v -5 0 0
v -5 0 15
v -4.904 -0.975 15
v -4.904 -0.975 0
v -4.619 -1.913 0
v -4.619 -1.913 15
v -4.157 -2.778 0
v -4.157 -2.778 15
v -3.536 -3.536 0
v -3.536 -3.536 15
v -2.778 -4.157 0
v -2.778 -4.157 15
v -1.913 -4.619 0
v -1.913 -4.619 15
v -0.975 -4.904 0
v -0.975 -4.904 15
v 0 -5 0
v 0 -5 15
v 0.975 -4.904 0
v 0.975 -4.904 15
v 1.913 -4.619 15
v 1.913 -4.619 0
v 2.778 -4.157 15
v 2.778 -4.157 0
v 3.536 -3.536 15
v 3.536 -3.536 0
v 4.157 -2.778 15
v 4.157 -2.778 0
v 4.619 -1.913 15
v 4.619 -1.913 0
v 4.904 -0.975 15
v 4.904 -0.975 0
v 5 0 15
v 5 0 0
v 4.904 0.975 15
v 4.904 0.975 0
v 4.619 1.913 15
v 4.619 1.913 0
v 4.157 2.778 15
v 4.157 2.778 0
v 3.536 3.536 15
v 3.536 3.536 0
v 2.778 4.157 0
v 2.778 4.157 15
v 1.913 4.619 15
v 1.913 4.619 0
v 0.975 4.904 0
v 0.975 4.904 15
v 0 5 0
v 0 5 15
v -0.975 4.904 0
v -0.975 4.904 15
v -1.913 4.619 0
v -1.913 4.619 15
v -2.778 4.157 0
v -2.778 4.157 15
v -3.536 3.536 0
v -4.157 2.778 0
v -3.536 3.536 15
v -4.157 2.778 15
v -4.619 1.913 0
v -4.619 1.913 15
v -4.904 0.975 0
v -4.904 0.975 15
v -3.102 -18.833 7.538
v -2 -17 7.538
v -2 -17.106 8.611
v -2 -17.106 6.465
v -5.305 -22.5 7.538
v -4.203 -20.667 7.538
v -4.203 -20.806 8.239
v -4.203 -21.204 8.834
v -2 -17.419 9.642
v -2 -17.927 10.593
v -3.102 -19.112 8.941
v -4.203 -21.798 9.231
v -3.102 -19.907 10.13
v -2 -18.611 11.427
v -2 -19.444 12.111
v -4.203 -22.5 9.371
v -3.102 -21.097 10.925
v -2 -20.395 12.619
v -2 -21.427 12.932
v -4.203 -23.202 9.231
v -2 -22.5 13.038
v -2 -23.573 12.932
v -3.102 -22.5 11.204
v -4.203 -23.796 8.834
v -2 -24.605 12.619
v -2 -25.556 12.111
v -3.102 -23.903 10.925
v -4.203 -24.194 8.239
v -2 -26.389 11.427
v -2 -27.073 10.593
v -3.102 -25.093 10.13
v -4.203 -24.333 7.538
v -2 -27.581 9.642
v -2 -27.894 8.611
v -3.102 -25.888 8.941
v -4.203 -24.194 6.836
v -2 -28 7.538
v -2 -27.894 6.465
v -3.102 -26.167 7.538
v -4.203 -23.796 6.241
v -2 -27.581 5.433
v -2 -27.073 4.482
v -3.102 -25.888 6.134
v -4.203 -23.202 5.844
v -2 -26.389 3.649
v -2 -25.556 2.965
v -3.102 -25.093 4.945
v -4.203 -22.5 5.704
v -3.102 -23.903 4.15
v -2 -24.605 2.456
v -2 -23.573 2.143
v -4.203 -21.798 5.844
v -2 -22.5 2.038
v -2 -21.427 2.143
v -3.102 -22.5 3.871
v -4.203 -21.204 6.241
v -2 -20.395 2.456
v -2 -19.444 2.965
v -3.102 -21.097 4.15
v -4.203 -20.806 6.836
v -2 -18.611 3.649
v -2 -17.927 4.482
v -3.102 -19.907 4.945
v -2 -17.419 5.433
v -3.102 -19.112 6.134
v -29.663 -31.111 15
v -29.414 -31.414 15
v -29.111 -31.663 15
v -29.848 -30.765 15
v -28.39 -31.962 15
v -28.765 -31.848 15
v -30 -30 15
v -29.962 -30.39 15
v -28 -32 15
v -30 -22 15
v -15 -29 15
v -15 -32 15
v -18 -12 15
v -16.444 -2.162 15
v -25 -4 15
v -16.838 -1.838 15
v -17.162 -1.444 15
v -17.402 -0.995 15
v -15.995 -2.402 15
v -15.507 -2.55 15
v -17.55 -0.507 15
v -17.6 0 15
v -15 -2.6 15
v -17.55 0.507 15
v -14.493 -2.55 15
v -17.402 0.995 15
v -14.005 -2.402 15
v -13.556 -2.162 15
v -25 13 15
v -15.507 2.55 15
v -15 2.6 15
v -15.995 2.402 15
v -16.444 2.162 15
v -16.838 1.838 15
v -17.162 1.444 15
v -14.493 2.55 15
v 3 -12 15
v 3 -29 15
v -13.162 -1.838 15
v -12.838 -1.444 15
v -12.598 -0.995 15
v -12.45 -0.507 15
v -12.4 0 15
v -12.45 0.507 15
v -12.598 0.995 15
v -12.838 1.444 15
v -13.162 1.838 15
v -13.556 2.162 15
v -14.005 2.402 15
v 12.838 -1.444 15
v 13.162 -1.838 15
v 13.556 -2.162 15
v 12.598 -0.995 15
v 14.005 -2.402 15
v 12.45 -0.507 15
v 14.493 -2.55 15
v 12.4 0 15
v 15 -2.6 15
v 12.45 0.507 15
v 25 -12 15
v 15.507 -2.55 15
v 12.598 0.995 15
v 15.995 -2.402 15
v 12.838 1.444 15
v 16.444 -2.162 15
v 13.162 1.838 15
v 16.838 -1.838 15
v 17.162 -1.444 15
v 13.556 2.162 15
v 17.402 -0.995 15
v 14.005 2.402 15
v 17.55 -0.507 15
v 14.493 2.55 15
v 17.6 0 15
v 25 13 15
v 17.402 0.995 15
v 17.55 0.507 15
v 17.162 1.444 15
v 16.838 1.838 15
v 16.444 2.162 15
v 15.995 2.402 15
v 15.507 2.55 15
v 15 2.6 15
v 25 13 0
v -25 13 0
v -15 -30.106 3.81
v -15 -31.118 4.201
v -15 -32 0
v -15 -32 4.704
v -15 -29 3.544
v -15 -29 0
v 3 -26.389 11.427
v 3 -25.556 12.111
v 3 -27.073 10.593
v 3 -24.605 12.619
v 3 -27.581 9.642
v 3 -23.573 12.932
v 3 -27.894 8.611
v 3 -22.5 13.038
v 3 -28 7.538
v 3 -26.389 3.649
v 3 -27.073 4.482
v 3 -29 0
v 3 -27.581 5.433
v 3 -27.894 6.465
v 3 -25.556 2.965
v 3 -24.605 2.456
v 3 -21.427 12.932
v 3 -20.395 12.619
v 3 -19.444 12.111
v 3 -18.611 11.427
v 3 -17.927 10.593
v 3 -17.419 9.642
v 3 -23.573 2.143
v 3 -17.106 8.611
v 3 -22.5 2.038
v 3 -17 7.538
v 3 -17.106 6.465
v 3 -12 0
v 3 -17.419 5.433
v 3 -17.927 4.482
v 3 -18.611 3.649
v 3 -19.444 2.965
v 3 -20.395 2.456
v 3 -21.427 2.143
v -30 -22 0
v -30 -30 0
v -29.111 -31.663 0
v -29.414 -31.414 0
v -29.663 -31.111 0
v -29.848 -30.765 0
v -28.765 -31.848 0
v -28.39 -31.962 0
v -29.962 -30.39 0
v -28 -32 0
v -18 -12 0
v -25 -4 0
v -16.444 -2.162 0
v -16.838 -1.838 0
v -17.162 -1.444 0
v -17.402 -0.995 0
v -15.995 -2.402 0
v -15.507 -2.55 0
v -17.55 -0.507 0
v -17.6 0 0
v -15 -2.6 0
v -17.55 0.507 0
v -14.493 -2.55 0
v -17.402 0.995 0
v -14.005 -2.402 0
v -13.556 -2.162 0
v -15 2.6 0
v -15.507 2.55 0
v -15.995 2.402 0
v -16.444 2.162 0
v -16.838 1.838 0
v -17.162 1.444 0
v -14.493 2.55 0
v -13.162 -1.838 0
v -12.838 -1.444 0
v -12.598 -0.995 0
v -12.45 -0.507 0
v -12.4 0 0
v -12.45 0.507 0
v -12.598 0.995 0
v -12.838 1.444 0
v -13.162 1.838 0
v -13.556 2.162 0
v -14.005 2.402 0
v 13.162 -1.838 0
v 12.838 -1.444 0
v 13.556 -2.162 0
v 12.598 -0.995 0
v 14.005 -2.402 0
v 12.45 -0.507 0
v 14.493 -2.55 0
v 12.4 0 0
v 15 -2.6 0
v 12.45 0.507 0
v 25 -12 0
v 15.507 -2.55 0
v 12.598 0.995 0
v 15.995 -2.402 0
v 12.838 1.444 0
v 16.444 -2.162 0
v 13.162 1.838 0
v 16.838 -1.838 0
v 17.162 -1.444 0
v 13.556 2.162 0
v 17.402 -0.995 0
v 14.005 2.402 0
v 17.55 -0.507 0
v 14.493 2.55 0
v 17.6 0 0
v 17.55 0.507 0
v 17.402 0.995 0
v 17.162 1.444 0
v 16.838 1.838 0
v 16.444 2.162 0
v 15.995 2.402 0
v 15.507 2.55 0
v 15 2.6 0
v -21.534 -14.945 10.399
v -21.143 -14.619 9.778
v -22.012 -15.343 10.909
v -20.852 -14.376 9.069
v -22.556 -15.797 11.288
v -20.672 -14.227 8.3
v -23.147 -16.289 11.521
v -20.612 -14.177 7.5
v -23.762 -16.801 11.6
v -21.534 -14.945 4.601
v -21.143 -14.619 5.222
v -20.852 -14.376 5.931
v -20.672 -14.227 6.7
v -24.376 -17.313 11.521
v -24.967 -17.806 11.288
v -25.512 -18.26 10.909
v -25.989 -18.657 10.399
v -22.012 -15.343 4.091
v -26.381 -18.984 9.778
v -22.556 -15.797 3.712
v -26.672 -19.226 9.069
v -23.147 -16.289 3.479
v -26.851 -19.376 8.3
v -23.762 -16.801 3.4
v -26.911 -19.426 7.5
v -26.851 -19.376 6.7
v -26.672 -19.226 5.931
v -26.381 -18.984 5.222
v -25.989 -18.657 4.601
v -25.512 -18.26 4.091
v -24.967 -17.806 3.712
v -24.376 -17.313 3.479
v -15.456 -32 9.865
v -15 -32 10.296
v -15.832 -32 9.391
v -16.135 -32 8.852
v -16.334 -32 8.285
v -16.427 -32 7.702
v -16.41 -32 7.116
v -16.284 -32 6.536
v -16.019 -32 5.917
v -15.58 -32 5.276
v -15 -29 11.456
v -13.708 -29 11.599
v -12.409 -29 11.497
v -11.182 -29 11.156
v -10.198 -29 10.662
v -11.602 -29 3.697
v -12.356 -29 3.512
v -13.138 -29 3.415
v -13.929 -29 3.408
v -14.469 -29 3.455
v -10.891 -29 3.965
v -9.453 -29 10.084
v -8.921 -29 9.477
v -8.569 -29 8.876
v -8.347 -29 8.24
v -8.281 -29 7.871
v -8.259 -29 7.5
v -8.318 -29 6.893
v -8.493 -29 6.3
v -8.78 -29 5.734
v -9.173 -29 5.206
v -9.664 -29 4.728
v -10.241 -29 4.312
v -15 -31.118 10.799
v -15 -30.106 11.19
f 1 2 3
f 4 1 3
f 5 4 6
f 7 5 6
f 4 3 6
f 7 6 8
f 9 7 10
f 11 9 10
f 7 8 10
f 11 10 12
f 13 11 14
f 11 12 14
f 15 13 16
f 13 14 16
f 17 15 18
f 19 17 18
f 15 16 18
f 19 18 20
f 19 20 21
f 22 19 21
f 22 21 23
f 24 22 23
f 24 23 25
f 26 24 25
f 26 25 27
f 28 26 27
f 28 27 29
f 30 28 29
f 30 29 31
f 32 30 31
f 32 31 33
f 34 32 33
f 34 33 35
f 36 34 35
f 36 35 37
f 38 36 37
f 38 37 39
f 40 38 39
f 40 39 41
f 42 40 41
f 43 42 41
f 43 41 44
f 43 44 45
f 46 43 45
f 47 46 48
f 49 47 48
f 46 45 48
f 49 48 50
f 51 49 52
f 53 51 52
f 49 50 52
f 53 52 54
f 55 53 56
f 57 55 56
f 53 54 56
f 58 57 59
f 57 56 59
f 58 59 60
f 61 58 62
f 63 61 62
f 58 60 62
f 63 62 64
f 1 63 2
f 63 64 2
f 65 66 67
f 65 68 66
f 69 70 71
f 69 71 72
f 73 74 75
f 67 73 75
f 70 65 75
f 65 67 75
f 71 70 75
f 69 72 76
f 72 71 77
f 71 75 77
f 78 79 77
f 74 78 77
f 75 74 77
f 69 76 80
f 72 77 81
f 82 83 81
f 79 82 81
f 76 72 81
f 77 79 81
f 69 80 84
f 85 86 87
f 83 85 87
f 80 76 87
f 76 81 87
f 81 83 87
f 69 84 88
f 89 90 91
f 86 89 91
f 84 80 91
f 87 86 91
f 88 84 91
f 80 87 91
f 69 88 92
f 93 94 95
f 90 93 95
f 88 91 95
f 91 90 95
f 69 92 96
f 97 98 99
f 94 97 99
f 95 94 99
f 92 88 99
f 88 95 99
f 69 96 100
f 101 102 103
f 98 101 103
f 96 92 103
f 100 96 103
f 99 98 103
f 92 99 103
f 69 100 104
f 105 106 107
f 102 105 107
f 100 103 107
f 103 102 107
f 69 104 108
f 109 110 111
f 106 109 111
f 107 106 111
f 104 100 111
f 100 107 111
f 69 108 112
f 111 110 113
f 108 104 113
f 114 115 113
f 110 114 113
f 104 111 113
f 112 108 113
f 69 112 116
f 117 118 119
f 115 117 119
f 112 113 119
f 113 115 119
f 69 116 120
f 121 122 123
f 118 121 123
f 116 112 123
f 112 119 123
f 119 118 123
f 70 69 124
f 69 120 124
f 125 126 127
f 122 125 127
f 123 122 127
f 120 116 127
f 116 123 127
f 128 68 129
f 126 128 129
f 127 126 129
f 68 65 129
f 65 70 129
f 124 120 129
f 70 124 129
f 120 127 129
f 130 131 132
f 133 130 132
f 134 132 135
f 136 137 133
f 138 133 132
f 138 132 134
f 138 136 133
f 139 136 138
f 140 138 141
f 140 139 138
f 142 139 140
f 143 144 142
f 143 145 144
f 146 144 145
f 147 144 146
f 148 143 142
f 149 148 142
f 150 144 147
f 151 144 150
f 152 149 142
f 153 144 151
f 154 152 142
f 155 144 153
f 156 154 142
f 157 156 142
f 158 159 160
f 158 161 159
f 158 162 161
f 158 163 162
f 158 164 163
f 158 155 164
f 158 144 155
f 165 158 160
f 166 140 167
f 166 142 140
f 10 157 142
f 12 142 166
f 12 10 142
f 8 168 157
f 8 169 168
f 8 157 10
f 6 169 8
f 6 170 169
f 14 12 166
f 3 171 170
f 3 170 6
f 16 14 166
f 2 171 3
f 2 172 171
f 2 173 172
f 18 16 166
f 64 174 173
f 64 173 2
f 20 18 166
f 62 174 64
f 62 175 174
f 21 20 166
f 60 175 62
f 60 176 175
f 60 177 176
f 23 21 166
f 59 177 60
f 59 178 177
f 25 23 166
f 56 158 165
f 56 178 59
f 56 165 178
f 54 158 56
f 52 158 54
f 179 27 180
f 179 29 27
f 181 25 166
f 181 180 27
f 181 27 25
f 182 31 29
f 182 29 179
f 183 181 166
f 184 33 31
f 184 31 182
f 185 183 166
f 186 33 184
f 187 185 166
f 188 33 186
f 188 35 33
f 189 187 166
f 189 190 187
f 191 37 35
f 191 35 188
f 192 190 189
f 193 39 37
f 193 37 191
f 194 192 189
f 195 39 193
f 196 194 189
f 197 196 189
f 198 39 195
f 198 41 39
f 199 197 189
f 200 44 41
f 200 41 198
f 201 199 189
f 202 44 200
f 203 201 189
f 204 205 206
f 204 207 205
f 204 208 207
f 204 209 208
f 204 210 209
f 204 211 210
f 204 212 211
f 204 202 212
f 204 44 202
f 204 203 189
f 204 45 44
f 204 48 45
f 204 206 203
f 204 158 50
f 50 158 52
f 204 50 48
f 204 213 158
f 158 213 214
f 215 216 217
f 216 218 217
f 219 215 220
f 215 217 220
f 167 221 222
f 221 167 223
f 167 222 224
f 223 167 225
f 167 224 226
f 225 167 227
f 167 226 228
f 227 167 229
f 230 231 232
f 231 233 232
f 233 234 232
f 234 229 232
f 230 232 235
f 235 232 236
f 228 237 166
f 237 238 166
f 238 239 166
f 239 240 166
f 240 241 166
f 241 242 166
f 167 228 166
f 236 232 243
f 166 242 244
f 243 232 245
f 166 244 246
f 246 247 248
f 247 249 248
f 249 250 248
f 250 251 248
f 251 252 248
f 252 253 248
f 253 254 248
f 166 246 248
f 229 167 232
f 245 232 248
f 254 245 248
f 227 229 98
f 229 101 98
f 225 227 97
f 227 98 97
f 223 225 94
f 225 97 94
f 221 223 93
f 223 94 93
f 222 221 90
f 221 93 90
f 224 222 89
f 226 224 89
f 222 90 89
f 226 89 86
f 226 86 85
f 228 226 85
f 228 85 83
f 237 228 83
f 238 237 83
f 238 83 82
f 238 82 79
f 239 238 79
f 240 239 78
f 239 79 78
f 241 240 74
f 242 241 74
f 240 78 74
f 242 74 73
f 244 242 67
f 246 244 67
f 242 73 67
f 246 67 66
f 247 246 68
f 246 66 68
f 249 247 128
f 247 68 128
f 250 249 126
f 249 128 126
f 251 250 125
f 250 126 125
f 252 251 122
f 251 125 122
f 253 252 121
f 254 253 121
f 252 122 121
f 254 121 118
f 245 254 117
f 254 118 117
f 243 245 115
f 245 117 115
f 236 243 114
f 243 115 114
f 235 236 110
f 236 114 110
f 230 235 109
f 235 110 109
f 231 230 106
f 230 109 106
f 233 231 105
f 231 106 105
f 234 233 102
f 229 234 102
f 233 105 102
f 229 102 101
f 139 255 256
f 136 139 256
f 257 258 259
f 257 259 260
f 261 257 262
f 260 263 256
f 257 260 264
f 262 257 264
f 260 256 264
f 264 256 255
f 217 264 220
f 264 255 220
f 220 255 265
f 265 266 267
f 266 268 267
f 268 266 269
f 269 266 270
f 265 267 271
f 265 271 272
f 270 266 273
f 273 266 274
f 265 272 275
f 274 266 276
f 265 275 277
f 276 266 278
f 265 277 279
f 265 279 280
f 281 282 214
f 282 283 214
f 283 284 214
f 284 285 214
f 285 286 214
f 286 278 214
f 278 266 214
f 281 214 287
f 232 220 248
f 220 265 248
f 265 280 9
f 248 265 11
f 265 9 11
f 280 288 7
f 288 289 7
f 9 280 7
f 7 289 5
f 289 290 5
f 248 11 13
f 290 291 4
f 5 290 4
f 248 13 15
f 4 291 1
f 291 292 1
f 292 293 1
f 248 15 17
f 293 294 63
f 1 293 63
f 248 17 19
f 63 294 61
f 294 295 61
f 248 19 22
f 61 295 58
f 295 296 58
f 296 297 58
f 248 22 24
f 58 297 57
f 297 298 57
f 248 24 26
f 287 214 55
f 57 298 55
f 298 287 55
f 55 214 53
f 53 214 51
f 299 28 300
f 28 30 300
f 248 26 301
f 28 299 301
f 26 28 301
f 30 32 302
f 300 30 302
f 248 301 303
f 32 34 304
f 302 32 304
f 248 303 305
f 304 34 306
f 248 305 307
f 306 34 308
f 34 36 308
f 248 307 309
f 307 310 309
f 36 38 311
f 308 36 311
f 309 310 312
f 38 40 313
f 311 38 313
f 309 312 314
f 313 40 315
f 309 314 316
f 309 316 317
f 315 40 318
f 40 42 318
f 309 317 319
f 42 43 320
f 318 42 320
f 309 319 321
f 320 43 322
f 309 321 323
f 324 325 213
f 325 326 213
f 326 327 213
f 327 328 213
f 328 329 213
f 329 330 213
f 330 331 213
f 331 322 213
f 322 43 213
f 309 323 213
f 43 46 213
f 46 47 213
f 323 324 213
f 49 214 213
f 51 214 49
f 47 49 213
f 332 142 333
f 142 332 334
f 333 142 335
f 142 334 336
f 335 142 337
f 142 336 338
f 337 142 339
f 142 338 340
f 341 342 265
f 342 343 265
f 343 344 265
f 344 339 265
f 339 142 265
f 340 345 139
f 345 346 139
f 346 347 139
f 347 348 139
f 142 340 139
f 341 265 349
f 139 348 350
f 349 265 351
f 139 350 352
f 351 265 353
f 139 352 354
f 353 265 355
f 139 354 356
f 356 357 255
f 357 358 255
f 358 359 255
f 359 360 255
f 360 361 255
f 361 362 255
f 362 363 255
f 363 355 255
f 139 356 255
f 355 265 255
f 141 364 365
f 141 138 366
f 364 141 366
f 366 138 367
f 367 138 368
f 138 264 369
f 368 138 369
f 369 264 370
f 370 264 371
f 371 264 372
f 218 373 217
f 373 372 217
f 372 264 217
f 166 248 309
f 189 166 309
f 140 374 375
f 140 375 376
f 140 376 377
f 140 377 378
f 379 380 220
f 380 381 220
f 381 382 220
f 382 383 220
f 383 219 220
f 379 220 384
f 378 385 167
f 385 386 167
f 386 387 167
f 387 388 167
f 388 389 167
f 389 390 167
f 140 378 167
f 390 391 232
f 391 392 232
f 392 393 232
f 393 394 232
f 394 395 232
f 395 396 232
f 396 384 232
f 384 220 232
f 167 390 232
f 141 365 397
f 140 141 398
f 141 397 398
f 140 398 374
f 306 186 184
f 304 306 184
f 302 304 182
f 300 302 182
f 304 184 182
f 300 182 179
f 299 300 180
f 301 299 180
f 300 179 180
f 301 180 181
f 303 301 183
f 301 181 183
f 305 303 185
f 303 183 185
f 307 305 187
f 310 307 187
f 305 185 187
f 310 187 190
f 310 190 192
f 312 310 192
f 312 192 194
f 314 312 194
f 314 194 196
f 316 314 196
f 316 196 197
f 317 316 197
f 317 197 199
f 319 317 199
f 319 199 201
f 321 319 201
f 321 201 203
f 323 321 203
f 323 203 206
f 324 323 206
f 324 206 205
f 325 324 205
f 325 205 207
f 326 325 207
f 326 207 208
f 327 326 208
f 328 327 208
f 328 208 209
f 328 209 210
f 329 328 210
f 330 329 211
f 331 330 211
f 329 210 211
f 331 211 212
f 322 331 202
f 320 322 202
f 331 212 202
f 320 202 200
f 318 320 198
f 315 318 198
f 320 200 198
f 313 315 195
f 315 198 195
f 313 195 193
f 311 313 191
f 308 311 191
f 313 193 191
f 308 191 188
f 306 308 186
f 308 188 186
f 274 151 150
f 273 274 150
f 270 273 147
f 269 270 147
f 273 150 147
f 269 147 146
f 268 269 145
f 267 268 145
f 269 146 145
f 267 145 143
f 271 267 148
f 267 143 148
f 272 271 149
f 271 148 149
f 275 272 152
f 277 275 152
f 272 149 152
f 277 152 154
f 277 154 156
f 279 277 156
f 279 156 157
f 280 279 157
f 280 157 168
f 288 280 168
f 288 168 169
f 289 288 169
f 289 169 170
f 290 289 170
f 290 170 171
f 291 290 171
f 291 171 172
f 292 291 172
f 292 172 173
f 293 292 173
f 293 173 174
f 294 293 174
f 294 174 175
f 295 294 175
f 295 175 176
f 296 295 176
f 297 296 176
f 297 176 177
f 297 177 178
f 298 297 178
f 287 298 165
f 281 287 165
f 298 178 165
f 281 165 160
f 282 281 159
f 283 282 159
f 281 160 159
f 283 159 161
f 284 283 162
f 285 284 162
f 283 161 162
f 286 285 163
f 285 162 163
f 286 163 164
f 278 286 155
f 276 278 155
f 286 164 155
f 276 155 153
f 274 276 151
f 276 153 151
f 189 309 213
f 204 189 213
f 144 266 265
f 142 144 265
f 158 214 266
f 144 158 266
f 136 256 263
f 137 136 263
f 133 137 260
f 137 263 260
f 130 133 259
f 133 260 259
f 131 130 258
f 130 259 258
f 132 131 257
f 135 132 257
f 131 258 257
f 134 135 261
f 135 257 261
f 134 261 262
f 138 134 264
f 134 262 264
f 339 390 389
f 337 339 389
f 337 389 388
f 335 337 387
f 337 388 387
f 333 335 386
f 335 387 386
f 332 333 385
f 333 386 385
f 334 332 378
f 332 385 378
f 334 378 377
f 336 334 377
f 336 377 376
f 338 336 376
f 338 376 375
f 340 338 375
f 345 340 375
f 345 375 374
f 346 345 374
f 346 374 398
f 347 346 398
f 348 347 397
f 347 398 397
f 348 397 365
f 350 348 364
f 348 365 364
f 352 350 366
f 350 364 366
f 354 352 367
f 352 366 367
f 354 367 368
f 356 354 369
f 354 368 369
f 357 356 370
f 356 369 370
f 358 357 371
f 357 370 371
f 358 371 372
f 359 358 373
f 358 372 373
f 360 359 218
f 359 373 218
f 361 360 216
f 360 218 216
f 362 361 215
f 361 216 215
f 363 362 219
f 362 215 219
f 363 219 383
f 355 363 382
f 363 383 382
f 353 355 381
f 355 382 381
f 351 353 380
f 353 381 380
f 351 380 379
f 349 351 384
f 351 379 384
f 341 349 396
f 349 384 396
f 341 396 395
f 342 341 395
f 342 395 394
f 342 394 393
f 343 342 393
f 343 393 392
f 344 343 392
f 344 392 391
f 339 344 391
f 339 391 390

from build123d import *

# Parameters (mm, degrees)
F1_DEPTH = 15
F2_D     = 5.2
F3_D     = 10
F5_D     = 8.2
F7_D     = 11
F7_DEPTH = 5
F7_TIP   = 3.3047334047


with BuildPart() as f1:
    # F0 (on Top) → F1 (new body)
    with BuildSketch(Plane.XY):
        with BuildLine():
            Line((25, 13), (-25, 13))
            Line((-25, 13), (-25, -4))
            Line((-25, -4), (-18, -12))
            Line((-18, -12), (-30, -22))
            Line((-30, -22), (-30, -30))
            ThreePointArc((-30, -30), (-29.4142135624, -31.4142135624), (-28, -32))
            Line((-28, -32), (-15, -32))
            Line((-15, -32), (-15, -29))
            Line((-15, -29), (3, -29))
            Line((3, -29), (3, -12))
            Line((3, -12), (25, -12))
            Line((25, -12), (25, 13))
        make_face()
    extrude(amount=F1_DEPTH)

    # F2 (through all)
    with Locations(Plane(origin=(0, 0, 0), x_dir=(1, 0, 0), z_dir=(0, 0, -1))):
        with Locations((-15, 0), (15, 0)):
            Hole(F2_D / 2)

    # F3 (through all)
    with Locations(Plane(origin=(0, 0, 0), x_dir=(1, 0, 0), z_dir=(0, 0, -1))):
        with Locations((0, 0)):
            Hole(F3_D / 2)

    # F5 (through all)
    with Locations(Plane(origin=(-1.4754098361, 1.7704918033, 0), x_dir=(-0.7682212796, -0.6401843997, 0), z_dir=(-0.6401843997, 0.7682212796, 0))):
        with Locations((29.0101958287, 7.5)):
            Hole(F5_D / 2)

    # F7
    with Locations(Plane.YZ.offset(3)):
        with Locations((-22.5, 7.5376075692)):
            Hole(F7_D / 2, depth=F7_DEPTH)
            with Locations((0, 0, -(F7_DEPTH + F7_TIP / 2))):  # 118° drill point
                Cone(0, F7_D / 2, F7_TIP, mode=Mode.SUBTRACT)


solid = f1.part
